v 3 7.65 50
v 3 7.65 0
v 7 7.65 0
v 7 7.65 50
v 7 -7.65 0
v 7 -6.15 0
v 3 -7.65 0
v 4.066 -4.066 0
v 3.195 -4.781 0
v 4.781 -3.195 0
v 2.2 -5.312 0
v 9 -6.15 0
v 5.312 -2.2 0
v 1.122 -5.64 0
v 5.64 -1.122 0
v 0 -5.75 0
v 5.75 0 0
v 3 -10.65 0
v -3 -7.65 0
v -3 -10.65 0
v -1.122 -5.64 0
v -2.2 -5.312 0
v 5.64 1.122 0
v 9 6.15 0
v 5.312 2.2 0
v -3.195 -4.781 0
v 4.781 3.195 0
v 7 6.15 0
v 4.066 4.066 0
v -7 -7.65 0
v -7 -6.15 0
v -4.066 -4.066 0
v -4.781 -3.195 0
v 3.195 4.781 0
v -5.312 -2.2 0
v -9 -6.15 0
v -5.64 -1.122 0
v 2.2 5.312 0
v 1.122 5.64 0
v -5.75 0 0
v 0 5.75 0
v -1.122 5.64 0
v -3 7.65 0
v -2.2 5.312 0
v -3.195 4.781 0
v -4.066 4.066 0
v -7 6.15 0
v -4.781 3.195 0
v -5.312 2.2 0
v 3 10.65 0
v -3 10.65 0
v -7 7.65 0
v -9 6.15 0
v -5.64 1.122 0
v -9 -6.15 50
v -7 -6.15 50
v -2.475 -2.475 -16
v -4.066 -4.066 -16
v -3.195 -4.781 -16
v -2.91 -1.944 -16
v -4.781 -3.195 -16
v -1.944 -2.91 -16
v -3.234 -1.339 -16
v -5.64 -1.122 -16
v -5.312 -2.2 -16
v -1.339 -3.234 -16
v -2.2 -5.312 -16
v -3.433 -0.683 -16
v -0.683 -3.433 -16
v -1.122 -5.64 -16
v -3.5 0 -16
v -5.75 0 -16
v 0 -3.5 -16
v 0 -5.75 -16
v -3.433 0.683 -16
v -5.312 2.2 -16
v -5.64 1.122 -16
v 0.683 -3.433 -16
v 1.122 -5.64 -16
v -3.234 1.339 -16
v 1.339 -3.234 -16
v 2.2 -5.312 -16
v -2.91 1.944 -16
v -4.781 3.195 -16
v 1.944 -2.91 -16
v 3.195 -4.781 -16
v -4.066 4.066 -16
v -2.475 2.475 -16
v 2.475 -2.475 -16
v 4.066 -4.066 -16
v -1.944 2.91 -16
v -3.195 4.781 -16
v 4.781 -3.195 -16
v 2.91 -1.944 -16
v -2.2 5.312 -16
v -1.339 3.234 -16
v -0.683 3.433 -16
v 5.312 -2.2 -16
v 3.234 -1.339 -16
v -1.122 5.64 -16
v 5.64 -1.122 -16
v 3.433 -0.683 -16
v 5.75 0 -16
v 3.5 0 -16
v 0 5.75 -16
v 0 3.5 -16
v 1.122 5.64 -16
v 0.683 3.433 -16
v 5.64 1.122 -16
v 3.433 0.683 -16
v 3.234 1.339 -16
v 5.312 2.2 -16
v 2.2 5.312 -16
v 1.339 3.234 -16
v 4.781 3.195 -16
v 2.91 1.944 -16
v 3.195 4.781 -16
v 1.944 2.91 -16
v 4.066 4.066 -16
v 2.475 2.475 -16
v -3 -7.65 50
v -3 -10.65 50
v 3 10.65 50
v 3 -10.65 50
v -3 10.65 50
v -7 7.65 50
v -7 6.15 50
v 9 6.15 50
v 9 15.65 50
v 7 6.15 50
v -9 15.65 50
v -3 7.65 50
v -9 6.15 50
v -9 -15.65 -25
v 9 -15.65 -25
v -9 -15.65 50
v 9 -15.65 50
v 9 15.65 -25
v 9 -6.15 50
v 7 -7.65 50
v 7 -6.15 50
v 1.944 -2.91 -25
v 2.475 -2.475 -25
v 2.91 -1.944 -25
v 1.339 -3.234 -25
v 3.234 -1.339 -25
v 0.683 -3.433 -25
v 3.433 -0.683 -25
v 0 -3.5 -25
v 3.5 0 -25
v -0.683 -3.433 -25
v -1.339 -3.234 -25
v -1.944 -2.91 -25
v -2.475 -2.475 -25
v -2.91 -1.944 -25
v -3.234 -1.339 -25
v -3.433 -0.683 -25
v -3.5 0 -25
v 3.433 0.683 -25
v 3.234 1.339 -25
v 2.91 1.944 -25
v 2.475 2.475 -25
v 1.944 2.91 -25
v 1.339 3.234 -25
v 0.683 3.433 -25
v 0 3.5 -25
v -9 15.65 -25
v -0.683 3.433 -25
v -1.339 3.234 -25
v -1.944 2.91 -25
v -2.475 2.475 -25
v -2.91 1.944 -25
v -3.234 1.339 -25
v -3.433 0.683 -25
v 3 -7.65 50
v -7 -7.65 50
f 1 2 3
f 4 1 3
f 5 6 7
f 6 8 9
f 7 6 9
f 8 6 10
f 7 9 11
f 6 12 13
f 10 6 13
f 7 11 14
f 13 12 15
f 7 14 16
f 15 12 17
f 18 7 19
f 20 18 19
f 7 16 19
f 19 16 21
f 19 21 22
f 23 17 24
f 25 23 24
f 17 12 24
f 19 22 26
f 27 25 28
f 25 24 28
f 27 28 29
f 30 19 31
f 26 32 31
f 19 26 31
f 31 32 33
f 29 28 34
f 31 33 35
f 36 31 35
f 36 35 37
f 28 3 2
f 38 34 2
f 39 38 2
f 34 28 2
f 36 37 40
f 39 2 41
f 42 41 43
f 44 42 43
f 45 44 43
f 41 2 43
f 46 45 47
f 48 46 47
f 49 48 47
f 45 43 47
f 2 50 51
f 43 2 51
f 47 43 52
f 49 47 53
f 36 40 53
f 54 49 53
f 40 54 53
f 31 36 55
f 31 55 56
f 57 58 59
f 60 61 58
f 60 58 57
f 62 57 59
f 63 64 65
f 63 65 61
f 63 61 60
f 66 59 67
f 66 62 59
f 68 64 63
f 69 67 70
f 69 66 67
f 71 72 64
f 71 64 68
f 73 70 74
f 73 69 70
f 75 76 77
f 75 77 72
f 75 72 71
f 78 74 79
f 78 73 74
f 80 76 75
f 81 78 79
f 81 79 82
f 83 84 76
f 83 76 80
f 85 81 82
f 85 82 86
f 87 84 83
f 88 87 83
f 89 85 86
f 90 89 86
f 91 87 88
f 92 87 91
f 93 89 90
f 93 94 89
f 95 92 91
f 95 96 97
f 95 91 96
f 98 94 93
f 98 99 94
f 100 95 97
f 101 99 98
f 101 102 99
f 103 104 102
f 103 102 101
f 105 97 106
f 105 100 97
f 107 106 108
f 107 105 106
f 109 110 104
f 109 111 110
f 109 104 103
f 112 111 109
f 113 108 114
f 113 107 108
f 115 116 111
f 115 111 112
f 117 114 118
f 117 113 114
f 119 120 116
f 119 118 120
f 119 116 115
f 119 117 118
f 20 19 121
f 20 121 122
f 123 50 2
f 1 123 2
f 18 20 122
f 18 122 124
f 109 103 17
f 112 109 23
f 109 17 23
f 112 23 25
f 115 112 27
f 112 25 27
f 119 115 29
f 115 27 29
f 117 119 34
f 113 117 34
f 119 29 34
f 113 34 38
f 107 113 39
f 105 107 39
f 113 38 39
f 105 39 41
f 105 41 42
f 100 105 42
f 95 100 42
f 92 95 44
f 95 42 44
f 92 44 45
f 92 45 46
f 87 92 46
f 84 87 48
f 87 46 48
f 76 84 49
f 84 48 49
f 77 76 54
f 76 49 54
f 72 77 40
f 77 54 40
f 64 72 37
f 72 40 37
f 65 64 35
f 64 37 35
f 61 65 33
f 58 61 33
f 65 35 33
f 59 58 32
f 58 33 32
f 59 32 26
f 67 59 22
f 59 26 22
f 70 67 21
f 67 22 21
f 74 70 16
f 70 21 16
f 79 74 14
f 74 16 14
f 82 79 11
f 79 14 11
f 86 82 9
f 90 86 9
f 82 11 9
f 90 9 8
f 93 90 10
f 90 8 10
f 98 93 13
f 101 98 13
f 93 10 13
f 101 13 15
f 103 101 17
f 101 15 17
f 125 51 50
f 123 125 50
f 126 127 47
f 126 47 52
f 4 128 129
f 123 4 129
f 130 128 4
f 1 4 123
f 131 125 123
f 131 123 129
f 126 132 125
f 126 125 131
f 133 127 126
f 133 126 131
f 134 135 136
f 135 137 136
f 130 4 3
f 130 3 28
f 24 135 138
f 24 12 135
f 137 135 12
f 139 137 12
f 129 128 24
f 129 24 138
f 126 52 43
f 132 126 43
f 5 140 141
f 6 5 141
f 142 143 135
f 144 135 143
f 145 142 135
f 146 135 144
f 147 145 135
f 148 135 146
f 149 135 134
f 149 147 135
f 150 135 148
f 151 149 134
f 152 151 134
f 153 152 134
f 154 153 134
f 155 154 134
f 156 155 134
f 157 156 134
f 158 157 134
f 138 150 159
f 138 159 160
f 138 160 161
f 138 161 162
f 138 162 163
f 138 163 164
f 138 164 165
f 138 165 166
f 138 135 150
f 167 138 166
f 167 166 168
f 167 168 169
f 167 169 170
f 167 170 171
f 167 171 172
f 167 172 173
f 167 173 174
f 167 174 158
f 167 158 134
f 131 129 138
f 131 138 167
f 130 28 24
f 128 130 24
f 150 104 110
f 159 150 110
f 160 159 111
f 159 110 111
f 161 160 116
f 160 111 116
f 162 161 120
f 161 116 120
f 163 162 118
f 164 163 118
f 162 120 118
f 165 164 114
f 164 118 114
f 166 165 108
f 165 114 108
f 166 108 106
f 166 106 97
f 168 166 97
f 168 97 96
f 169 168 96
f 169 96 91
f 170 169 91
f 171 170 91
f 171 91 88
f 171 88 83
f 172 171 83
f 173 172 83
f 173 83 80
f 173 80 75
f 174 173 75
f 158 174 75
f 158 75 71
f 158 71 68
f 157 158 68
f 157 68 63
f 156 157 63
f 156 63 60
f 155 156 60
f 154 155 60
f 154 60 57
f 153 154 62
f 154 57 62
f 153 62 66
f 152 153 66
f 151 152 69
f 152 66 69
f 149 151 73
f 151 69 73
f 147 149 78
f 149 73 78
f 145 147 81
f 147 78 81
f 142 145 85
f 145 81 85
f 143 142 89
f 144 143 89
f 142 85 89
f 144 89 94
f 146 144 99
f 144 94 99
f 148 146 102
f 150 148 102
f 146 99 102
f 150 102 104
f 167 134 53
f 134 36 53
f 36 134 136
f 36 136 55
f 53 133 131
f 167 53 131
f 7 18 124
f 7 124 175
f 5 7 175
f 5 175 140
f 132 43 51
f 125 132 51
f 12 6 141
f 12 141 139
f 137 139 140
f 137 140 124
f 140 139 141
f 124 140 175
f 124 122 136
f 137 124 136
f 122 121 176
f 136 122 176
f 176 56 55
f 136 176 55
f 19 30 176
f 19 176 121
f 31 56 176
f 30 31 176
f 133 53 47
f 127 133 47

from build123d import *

# Parameters (mm, degrees)
BOSS_EXTRUDE1_DEPTH = 50
SKETCH3_W           = 18
SKETCH3_H           = 31.3
BOSS_EXTRUDE2_DEPTH = 25
SKETCH4_R           = 5.75
CUT_EXTRUDE1_DEPTH  = 16
SKETCH5_R           = 3.5
CUT_EXTRUDE2_DEPTH  = 10


with BuildPart() as part:
    # Sketch2 → Boss-Extrude1 (new body)
    with BuildSketch(Plane.XY):
        Polygon((-3, -10.65), (3, -10.65), (3, -7.65), (7, -7.65), (7, -6.15), (9, -6.15), (9, -7.65), (9, -15.65), (-9, -15.65), (-9, -7.65), (-9, -6.15), (-7, -6.15), (-7, -7.65), (-3, -7.65), align=None)
    extrude(amount=BOSS_EXTRUDE1_DEPTH)


with BuildPart() as body_2:
    # Mirror2: mirrored copy
    add(part.part.mirror(Plane.ZX))


with BuildPart() as part_1:
    add(part.part)

    add(body_2.part)  # Boss-Extrude2 merges body 2
    # Sketch3 → Boss-Extrude2 (add)
    with BuildSketch(Plane(origin=(0, 0, 0), x_dir=(-1, 0, 0), z_dir=(0, 0, -1))):
        Rectangle(SKETCH3_W, SKETCH3_H)
    extrude(amount=BOSS_EXTRUDE2_DEPTH)

    # Sketch4 → Cut-Extrude1 (cut)
    with BuildSketch(Plane.XY):
        Circle(SKETCH4_R)
    extrude(amount=-CUT_EXTRUDE1_DEPTH, mode=Mode.SUBTRACT)

    # Sketch5 → Cut-Extrude2 (cut, through all)
    with BuildSketch(Plane.XY.offset(-16)):
        Circle(SKETCH5_R)
    extrude(amount=-CUT_EXTRUDE2_DEPTH, mode=Mode.SUBTRACT)


solid = part_1.part
